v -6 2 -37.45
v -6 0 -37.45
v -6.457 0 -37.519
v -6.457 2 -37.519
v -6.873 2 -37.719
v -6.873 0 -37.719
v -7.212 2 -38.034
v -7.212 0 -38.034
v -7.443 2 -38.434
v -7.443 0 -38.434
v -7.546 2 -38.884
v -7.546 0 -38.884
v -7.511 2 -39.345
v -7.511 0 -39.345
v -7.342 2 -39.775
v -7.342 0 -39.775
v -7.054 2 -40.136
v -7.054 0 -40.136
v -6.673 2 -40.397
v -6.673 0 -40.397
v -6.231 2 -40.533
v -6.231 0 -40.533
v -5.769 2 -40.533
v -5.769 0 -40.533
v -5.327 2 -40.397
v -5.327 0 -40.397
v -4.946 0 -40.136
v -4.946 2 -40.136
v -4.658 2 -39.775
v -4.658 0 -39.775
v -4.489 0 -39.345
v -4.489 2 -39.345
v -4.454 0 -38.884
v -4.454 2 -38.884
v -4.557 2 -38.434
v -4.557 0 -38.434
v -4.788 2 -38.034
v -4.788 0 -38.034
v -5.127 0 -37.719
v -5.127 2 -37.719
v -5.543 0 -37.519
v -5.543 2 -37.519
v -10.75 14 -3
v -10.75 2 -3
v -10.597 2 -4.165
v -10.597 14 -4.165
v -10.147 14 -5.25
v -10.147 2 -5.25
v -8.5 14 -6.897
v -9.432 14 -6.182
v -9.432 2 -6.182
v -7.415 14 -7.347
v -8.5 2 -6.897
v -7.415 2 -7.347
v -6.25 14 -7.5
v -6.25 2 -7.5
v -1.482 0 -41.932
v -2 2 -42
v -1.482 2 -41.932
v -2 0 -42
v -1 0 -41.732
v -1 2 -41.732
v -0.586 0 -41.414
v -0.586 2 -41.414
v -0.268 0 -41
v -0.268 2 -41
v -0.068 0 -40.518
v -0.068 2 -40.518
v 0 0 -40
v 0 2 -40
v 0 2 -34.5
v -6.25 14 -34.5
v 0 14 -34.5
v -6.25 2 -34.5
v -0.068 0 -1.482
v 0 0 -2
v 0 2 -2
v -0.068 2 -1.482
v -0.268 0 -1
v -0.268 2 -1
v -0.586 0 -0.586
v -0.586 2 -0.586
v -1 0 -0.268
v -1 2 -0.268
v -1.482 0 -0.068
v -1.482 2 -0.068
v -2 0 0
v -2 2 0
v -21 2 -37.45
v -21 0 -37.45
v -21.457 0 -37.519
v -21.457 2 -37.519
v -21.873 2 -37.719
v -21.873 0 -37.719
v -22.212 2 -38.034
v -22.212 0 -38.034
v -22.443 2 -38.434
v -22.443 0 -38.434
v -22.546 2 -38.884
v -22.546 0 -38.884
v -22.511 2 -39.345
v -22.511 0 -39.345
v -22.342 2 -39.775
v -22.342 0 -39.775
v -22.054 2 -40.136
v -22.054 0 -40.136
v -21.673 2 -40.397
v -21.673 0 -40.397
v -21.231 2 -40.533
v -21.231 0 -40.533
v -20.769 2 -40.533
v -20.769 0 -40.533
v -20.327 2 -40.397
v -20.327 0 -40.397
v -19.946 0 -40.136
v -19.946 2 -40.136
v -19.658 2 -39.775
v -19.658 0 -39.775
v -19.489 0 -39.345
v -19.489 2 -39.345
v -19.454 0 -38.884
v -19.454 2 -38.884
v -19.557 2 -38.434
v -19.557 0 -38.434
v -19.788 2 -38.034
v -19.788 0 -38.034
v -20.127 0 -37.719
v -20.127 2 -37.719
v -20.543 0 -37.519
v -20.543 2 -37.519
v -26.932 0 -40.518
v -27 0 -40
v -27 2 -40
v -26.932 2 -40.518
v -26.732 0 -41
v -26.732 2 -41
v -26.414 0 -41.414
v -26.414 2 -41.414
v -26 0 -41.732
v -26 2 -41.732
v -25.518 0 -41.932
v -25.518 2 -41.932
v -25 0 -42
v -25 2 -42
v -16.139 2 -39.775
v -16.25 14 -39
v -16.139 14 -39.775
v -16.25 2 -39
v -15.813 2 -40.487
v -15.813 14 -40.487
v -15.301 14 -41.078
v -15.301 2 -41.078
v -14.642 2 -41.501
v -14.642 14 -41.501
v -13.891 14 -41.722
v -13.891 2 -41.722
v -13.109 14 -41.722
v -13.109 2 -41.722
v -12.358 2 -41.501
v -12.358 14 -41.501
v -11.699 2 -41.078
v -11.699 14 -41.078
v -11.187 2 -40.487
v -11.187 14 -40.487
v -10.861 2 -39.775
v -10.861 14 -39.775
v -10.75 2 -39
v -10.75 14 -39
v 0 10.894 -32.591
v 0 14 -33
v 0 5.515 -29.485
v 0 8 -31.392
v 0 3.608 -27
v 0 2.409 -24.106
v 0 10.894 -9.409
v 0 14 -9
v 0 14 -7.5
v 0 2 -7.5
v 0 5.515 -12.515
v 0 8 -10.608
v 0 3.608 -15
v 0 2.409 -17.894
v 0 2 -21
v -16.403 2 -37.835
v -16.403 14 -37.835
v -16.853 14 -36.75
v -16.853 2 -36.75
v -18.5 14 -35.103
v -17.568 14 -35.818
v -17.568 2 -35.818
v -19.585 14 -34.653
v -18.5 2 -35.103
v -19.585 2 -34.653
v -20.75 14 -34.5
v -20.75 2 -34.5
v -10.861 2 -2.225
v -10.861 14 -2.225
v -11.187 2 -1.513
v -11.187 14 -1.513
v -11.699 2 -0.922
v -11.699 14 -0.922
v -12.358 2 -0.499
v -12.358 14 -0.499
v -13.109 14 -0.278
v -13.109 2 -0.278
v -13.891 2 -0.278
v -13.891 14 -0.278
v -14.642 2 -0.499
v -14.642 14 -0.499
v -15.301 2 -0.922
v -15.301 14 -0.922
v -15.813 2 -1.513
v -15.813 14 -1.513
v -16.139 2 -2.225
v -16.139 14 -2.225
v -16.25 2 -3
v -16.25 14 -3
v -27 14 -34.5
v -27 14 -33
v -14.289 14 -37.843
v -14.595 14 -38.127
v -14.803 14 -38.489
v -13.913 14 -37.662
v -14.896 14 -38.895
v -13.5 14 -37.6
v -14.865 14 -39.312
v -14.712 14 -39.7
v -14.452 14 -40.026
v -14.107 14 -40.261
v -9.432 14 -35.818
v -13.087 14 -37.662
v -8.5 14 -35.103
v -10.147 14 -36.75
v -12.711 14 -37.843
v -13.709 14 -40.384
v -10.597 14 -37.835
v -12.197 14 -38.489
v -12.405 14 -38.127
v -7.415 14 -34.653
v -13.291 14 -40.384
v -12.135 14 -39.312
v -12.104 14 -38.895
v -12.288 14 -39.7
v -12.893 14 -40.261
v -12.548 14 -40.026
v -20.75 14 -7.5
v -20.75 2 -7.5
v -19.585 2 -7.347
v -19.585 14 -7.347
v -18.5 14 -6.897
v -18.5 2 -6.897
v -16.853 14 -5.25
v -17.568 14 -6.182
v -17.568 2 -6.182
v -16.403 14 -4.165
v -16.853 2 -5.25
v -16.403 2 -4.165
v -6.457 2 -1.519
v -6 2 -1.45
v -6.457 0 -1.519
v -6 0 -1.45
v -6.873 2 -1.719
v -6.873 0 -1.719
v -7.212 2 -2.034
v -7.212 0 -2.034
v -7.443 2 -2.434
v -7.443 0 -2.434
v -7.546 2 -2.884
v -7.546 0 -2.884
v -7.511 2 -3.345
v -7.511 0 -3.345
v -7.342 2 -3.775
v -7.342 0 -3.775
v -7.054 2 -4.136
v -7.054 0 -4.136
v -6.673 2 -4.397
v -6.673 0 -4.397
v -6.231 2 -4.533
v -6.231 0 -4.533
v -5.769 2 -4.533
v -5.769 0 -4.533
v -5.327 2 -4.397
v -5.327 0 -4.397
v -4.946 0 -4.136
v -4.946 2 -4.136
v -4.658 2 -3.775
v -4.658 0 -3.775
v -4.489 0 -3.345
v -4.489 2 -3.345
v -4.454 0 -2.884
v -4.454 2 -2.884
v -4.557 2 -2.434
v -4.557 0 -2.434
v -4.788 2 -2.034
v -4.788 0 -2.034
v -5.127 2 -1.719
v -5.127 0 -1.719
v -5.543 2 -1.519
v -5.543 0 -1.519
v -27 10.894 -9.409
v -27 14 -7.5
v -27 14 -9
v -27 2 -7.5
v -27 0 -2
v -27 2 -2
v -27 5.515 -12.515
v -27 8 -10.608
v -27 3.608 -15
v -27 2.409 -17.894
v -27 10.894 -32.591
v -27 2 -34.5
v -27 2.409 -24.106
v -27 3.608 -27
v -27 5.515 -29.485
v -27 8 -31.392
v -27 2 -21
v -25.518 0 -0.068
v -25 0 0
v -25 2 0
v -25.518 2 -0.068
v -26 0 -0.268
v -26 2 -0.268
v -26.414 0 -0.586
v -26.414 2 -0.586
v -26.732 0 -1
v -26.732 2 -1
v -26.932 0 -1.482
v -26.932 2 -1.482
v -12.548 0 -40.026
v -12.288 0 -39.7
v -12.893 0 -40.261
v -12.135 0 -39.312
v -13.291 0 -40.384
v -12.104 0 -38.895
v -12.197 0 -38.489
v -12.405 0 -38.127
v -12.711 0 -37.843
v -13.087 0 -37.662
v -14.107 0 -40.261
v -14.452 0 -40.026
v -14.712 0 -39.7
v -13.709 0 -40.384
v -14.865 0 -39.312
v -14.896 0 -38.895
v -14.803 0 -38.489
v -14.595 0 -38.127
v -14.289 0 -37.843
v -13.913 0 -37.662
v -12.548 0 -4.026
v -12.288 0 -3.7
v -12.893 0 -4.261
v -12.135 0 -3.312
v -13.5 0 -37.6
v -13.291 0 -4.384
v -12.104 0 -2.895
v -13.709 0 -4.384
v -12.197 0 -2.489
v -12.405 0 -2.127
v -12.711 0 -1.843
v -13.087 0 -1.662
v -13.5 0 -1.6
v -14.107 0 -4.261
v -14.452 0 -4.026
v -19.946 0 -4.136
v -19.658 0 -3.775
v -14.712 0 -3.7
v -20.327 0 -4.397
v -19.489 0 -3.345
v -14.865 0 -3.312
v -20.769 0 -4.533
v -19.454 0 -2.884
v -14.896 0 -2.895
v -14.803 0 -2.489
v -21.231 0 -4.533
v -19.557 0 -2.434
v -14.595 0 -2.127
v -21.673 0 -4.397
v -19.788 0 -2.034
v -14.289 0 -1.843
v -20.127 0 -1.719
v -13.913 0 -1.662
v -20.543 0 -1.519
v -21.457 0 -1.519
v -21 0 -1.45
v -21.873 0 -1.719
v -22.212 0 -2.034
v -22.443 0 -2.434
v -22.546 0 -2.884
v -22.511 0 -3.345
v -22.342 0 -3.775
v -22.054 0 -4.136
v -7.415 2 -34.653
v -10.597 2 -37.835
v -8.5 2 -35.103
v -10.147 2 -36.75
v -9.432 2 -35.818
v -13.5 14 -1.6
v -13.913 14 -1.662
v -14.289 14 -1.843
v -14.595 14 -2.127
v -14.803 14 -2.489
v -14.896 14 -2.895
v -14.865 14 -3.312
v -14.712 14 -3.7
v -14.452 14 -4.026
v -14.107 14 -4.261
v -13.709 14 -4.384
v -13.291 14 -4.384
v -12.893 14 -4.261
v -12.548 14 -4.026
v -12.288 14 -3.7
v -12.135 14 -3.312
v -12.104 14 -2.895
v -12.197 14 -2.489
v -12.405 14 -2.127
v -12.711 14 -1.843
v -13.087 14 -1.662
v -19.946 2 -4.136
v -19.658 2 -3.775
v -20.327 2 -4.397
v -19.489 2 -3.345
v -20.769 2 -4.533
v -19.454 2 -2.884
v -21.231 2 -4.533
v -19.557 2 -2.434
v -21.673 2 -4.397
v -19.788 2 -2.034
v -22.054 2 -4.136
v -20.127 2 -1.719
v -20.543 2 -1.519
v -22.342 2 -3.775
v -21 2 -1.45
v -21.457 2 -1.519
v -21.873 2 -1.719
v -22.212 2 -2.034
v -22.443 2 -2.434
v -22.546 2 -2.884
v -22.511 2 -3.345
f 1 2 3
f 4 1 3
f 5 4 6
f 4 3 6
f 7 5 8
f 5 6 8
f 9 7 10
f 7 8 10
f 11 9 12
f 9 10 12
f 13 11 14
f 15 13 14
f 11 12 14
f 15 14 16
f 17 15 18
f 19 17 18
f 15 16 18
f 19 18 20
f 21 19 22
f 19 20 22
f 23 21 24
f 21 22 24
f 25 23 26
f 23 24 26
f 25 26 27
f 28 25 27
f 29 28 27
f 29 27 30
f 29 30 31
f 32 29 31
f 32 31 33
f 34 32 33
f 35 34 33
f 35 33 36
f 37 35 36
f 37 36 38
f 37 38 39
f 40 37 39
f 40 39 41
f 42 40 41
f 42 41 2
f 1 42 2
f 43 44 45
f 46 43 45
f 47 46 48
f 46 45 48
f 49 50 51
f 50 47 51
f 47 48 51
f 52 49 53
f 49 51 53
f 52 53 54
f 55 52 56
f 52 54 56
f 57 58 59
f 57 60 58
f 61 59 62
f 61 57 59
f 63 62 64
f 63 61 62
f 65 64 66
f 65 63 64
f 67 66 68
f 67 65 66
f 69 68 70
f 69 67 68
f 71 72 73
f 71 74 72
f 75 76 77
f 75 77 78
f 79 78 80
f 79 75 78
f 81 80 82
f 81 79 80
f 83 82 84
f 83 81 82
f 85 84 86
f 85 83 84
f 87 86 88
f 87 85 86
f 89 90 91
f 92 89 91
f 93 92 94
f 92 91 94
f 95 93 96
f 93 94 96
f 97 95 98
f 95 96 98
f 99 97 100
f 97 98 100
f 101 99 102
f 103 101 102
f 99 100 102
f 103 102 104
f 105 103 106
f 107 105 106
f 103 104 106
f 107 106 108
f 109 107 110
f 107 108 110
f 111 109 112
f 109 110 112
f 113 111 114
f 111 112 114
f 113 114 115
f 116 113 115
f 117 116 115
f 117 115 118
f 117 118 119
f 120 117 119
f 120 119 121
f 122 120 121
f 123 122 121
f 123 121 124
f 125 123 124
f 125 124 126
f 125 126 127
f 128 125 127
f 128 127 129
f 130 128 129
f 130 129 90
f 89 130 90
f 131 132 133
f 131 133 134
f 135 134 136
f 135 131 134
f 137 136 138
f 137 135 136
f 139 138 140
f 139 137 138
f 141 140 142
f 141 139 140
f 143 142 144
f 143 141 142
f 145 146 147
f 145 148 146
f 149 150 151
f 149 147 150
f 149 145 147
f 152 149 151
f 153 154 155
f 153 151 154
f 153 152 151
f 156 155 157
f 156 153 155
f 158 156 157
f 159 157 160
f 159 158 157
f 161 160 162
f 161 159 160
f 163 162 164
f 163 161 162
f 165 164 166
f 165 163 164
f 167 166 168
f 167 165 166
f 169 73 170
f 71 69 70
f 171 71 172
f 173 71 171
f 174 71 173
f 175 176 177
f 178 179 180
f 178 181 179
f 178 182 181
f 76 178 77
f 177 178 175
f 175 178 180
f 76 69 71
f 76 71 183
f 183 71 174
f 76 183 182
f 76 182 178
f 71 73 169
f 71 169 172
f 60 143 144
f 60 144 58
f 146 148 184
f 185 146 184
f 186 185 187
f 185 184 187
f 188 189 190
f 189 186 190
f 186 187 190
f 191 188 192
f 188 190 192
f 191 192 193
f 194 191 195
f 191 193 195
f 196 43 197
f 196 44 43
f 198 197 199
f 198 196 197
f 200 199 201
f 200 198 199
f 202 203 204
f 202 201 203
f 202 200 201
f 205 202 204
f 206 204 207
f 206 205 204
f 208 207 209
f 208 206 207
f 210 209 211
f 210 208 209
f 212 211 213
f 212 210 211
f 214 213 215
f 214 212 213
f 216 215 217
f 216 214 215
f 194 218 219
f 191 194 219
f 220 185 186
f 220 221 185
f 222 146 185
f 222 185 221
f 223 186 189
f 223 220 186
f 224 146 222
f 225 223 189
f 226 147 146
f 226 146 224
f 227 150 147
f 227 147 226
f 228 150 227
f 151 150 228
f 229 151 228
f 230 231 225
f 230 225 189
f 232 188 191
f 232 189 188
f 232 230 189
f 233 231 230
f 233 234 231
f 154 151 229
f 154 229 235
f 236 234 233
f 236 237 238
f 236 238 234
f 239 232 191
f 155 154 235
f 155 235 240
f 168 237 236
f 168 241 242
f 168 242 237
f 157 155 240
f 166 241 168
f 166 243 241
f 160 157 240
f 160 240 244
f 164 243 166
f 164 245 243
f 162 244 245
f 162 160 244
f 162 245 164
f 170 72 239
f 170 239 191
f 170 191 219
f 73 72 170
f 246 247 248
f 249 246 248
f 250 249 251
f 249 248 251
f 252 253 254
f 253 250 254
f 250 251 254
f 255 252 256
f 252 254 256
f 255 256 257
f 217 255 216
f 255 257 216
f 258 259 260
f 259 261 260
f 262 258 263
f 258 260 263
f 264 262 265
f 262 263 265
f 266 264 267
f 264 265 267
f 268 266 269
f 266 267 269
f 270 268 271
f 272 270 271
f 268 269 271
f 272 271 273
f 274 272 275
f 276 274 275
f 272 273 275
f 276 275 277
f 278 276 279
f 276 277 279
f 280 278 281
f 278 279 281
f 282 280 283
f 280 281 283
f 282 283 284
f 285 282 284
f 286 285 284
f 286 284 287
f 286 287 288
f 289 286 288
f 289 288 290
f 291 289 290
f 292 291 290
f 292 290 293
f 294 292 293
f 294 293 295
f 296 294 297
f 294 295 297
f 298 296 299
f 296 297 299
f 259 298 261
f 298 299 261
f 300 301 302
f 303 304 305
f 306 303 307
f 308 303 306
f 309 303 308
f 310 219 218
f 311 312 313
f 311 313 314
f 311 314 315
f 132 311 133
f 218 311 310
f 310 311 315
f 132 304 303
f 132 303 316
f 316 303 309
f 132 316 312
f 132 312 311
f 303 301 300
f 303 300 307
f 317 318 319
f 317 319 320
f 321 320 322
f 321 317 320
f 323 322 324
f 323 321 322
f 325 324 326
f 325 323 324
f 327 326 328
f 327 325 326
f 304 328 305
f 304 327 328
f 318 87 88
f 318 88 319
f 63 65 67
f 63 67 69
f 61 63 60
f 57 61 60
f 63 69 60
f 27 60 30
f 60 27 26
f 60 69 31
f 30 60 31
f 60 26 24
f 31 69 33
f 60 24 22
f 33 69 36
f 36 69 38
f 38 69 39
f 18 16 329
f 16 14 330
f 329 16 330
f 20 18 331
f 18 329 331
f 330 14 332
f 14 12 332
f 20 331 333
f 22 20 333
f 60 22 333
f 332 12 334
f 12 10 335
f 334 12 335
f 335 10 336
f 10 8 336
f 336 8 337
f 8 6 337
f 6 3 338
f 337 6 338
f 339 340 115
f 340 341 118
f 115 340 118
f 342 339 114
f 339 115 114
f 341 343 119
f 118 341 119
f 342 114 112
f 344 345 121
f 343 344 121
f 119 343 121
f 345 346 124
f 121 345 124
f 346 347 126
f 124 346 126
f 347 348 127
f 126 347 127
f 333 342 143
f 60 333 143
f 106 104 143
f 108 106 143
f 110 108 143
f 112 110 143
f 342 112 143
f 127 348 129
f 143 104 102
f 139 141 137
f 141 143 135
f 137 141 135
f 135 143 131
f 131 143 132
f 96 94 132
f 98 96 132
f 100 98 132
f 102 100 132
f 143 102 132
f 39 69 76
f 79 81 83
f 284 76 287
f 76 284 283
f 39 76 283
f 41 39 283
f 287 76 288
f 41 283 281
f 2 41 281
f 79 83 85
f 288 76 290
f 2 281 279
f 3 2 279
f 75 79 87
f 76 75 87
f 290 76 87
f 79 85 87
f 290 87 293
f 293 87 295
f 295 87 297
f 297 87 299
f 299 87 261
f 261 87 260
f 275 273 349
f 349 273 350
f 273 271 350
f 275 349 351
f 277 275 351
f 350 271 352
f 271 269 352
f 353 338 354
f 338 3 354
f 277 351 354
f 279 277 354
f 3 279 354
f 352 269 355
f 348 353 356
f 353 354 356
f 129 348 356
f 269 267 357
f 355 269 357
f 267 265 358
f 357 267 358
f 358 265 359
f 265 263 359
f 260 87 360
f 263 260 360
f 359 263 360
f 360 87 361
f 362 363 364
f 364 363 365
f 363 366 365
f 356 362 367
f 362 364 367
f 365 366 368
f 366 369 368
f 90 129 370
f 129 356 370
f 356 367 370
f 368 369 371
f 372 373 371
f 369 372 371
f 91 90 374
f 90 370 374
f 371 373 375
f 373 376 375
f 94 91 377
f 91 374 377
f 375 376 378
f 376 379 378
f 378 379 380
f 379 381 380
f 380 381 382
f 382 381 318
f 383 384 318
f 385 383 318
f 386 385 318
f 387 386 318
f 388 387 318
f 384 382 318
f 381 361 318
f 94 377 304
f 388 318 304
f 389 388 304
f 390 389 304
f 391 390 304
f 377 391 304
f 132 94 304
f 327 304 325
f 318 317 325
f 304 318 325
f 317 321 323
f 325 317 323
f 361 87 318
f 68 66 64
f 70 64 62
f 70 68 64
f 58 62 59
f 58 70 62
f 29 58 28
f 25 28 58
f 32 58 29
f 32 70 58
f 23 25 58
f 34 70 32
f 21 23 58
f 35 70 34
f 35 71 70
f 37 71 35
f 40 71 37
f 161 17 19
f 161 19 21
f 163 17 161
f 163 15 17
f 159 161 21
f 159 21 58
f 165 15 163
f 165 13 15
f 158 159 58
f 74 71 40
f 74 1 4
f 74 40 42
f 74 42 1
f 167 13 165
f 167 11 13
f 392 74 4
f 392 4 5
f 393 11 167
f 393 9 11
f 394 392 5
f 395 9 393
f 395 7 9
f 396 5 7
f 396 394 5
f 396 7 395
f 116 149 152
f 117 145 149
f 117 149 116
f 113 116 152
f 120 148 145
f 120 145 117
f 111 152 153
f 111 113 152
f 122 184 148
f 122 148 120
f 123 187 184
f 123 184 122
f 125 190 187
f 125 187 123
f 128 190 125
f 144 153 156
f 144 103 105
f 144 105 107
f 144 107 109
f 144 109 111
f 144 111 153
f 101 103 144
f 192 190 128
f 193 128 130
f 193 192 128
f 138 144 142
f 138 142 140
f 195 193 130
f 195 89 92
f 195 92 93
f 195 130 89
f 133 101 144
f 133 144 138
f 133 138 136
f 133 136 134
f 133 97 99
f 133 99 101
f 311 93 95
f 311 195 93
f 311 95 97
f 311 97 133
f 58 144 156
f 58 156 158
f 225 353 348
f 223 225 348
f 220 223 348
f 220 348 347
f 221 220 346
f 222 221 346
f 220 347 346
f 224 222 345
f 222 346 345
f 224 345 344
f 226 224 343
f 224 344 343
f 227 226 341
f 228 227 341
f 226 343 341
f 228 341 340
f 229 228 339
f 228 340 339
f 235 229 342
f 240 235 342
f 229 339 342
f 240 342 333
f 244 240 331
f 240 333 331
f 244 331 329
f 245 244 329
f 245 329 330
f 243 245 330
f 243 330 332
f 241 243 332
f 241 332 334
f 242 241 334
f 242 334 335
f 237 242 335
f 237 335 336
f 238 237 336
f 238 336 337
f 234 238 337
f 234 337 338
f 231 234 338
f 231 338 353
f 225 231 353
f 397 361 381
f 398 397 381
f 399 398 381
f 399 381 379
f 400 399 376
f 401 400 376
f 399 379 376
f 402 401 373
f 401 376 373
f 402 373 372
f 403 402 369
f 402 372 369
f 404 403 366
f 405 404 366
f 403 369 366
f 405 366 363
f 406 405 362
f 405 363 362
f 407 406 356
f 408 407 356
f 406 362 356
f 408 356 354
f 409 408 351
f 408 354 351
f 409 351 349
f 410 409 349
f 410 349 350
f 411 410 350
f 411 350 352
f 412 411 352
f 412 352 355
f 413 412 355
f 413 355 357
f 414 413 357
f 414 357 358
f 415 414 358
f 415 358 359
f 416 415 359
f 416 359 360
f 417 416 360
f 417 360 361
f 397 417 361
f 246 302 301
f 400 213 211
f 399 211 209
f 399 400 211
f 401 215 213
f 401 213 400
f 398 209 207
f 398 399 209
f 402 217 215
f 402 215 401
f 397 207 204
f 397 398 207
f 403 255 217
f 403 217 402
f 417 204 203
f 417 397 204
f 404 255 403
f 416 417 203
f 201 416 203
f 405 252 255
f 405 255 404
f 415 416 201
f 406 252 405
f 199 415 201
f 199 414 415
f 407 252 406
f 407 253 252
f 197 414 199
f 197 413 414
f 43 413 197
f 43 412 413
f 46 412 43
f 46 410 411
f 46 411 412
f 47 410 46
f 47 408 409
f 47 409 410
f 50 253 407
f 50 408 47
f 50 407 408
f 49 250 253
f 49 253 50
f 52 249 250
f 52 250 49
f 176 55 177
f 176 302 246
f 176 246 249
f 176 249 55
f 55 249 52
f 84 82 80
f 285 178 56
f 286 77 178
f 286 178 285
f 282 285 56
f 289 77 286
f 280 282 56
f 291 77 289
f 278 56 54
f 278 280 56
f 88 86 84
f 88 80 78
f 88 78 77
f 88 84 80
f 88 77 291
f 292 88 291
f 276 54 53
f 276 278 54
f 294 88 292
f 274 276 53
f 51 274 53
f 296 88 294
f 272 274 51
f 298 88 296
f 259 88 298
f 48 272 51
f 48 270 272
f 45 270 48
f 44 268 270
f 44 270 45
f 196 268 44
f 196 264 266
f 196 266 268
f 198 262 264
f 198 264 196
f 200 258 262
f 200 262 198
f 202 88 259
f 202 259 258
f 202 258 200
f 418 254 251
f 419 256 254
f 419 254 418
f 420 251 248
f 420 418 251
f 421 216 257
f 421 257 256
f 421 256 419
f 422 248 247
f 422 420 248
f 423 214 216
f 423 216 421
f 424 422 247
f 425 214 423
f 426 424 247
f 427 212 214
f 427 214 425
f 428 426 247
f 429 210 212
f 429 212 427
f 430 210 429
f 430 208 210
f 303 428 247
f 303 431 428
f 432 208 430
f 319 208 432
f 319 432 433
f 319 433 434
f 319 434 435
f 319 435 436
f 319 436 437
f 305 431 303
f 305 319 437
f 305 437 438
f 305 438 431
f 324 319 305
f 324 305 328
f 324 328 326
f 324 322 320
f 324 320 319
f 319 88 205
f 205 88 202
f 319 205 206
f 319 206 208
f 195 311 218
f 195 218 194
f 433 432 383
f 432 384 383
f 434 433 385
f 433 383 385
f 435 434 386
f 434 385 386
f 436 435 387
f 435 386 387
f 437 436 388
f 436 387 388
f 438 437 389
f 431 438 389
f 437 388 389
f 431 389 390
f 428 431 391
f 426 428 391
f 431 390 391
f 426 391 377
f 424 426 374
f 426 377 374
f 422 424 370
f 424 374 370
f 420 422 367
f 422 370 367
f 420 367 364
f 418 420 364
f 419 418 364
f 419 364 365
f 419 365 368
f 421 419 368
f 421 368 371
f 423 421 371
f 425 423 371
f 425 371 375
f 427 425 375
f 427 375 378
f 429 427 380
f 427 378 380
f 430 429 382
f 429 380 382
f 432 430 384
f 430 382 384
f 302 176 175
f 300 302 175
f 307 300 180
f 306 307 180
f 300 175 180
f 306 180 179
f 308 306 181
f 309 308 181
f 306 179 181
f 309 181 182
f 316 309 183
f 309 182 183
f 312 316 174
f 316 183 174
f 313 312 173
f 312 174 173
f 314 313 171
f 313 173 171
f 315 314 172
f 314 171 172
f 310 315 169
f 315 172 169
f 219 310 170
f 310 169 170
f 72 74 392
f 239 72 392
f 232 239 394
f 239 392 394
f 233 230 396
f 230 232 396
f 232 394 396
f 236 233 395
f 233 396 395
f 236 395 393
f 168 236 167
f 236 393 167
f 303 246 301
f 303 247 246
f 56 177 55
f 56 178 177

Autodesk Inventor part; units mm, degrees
ref_plane "YZ Plane" through (0, 0, 0) normal (1, 0, 0) x (0, 1, 0)
ref_plane "XZ Plane" through (0, 0, 0) normal (0, 1, 0) x (-1, 0, 0)
ref_plane "XY Plane" through (0, 0, 0) normal (0, 0, 1) x (1, 0, 0)
sketch "スケッチ1" plane through (0, 0, 0) normal (0, 1, 0) x (-1, 0, 0)
  line L0 (2, 0) -> (25, 0)
  line L1 (27, -2) -> (27, -40)
  line L2 (25, -42) -> (2, -42)
  line L3 (0, -40) -> (0, -2)
  arc A0 (27, -2) -> (25, 0) centre (25, -2) ccw
  arc A1 (25, -42) -> (27, -40) centre (25, -40) ccw
  arc A2 (2, 0) -> (0, -2) centre (2, -2) ccw
  arc A3 (0, -40) -> (2, -42) centre (2, -40) ccw
  point P0 (0, 0)
  point P1 (27, -42)
  point P2 (27, 0)
  point P3 (0, -42)
  dimension "d0" = 27
  dimension "d1" = 42
  dimension "d2" = 2
extrude "押し出し1" add sketch "スケッチ1" along normal blind 2
sketch "スケッチ2" plane through (0, 2, 0) normal (0, 1, 0) x (1, 0, 0)
  line L0 (-27, 40) -> (-27, 2) projected
  line L1 (0, 2) -> (0, 40) projected
  line L2 (-2, 42) -> (-25, 42) projected
  line L3 (-25, 0) -> (-2, 0) projected
  point P0 (0, 0)
  point P1 (-21, 39)
  point P2 (-6, 39)
  point P3 (-21, 3)
  point P4 (-6, 3)
  dimension "d5" = 6
  dimension "d6" = 6
  dimension "d7" = 6
  dimension "d8" = 6
  dimension "d9" = 3
  dimension "d10" = 3
  dimension "d11" = 3
  dimension "d12" = 3
hole "穴1" at (-21, 2, -39) at (-6, 2, -39) at (-21, 2, -3) at (-6, 2, -3) direction (0, -1, 0) diameter 3.1 end through all
sketch "スケッチ3" plane through (0, 2, 0) normal (0, 1, 0) x (1, 0, 0)
  line L0 (-27, 40) -> (-27, 2) projected
  line L1 (-27, 34.5) -> (0, 34.5)
  line L2 (0, 34.5) -> (0, 7.5)
  line L3 (0, 7.5) -> (-27, 7.5)
  line L4 (-27, 7.5) -> (-27, 34.5)
  line L5 (0, 2) -> (0, 40) projected
  circle A0 centre (-13.5, 3) radius 2.75
  circle A1 centre (-13.5, 39) radius 2.75
  arc A2 (-20.75, 34.5) -> (-16.25, 39) centre (-20.75, 39) ccw
  arc A3 (-10.75, 39) -> (-6.25, 34.5) centre (-6.25, 39) ccw
  line L6 (-16.25, 3) -> (-20.75, 3)
  line L7 (-10.75, 3) -> (-6.25, 3)
  arc A4 (-16.25, 3) -> (-20.75, 7.5) centre (-20.75, 3) ccw
  arc A5 (-6.25, 7.5) -> (-10.75, 3) centre (-6.25, 3) ccw
  point P0 (0, 0)
  point P1 (0, 21)
  point P2 (0, 21)
  dimension "d20" = 27
  dimension "d21" = 27
  dimension "d22" = 0
  dimension "d23" = 5.5
  dimension "d24" = 5.5
  dimension "d25" = 4.5
  dimension "d27" = 4.5
  dimension "d29" = 4.5
  dimension "d30" = 4.5
extrude "押し出し2" add sketch "スケッチ3" along normal blind 12
sketch "スケッチ4" plane through (0, 0, -2) normal (1, 0, 0) x (0, 0, -1)
  line L0 (32.5, 14) -> (5.5, 14) projected
  circle A0 centre (19, 14) radius 12
  point P0 (-2, 0)
  point P1 (7, 14)
  point P2 (31, 14)
  dimension "d33" = 24
extrude "押し出し3" cut sketch "スケッチ4" against normal through all contours A0 L0 picked at (15.4582, 12.1411)
sketch "スケッチ5" plane through (0, 14, 0) normal (0, 1, 0) x (1, 0, 0)
  arc A0 (-10.75, 39) -> (-16.25, 39) centre (-13.5, 39) ccw projected
  arc A1 (-16.25, 3) -> (-10.75, 3) centre (-13.5, 3) ccw projected
  point P0 (0, 0)
hole "穴2" at (-13.5, 14, -39) at (-13.5, 14, -3) direction (0, -1, 0) diameter 2.8 end through all
properties part number "daisen_moto_parts1"
